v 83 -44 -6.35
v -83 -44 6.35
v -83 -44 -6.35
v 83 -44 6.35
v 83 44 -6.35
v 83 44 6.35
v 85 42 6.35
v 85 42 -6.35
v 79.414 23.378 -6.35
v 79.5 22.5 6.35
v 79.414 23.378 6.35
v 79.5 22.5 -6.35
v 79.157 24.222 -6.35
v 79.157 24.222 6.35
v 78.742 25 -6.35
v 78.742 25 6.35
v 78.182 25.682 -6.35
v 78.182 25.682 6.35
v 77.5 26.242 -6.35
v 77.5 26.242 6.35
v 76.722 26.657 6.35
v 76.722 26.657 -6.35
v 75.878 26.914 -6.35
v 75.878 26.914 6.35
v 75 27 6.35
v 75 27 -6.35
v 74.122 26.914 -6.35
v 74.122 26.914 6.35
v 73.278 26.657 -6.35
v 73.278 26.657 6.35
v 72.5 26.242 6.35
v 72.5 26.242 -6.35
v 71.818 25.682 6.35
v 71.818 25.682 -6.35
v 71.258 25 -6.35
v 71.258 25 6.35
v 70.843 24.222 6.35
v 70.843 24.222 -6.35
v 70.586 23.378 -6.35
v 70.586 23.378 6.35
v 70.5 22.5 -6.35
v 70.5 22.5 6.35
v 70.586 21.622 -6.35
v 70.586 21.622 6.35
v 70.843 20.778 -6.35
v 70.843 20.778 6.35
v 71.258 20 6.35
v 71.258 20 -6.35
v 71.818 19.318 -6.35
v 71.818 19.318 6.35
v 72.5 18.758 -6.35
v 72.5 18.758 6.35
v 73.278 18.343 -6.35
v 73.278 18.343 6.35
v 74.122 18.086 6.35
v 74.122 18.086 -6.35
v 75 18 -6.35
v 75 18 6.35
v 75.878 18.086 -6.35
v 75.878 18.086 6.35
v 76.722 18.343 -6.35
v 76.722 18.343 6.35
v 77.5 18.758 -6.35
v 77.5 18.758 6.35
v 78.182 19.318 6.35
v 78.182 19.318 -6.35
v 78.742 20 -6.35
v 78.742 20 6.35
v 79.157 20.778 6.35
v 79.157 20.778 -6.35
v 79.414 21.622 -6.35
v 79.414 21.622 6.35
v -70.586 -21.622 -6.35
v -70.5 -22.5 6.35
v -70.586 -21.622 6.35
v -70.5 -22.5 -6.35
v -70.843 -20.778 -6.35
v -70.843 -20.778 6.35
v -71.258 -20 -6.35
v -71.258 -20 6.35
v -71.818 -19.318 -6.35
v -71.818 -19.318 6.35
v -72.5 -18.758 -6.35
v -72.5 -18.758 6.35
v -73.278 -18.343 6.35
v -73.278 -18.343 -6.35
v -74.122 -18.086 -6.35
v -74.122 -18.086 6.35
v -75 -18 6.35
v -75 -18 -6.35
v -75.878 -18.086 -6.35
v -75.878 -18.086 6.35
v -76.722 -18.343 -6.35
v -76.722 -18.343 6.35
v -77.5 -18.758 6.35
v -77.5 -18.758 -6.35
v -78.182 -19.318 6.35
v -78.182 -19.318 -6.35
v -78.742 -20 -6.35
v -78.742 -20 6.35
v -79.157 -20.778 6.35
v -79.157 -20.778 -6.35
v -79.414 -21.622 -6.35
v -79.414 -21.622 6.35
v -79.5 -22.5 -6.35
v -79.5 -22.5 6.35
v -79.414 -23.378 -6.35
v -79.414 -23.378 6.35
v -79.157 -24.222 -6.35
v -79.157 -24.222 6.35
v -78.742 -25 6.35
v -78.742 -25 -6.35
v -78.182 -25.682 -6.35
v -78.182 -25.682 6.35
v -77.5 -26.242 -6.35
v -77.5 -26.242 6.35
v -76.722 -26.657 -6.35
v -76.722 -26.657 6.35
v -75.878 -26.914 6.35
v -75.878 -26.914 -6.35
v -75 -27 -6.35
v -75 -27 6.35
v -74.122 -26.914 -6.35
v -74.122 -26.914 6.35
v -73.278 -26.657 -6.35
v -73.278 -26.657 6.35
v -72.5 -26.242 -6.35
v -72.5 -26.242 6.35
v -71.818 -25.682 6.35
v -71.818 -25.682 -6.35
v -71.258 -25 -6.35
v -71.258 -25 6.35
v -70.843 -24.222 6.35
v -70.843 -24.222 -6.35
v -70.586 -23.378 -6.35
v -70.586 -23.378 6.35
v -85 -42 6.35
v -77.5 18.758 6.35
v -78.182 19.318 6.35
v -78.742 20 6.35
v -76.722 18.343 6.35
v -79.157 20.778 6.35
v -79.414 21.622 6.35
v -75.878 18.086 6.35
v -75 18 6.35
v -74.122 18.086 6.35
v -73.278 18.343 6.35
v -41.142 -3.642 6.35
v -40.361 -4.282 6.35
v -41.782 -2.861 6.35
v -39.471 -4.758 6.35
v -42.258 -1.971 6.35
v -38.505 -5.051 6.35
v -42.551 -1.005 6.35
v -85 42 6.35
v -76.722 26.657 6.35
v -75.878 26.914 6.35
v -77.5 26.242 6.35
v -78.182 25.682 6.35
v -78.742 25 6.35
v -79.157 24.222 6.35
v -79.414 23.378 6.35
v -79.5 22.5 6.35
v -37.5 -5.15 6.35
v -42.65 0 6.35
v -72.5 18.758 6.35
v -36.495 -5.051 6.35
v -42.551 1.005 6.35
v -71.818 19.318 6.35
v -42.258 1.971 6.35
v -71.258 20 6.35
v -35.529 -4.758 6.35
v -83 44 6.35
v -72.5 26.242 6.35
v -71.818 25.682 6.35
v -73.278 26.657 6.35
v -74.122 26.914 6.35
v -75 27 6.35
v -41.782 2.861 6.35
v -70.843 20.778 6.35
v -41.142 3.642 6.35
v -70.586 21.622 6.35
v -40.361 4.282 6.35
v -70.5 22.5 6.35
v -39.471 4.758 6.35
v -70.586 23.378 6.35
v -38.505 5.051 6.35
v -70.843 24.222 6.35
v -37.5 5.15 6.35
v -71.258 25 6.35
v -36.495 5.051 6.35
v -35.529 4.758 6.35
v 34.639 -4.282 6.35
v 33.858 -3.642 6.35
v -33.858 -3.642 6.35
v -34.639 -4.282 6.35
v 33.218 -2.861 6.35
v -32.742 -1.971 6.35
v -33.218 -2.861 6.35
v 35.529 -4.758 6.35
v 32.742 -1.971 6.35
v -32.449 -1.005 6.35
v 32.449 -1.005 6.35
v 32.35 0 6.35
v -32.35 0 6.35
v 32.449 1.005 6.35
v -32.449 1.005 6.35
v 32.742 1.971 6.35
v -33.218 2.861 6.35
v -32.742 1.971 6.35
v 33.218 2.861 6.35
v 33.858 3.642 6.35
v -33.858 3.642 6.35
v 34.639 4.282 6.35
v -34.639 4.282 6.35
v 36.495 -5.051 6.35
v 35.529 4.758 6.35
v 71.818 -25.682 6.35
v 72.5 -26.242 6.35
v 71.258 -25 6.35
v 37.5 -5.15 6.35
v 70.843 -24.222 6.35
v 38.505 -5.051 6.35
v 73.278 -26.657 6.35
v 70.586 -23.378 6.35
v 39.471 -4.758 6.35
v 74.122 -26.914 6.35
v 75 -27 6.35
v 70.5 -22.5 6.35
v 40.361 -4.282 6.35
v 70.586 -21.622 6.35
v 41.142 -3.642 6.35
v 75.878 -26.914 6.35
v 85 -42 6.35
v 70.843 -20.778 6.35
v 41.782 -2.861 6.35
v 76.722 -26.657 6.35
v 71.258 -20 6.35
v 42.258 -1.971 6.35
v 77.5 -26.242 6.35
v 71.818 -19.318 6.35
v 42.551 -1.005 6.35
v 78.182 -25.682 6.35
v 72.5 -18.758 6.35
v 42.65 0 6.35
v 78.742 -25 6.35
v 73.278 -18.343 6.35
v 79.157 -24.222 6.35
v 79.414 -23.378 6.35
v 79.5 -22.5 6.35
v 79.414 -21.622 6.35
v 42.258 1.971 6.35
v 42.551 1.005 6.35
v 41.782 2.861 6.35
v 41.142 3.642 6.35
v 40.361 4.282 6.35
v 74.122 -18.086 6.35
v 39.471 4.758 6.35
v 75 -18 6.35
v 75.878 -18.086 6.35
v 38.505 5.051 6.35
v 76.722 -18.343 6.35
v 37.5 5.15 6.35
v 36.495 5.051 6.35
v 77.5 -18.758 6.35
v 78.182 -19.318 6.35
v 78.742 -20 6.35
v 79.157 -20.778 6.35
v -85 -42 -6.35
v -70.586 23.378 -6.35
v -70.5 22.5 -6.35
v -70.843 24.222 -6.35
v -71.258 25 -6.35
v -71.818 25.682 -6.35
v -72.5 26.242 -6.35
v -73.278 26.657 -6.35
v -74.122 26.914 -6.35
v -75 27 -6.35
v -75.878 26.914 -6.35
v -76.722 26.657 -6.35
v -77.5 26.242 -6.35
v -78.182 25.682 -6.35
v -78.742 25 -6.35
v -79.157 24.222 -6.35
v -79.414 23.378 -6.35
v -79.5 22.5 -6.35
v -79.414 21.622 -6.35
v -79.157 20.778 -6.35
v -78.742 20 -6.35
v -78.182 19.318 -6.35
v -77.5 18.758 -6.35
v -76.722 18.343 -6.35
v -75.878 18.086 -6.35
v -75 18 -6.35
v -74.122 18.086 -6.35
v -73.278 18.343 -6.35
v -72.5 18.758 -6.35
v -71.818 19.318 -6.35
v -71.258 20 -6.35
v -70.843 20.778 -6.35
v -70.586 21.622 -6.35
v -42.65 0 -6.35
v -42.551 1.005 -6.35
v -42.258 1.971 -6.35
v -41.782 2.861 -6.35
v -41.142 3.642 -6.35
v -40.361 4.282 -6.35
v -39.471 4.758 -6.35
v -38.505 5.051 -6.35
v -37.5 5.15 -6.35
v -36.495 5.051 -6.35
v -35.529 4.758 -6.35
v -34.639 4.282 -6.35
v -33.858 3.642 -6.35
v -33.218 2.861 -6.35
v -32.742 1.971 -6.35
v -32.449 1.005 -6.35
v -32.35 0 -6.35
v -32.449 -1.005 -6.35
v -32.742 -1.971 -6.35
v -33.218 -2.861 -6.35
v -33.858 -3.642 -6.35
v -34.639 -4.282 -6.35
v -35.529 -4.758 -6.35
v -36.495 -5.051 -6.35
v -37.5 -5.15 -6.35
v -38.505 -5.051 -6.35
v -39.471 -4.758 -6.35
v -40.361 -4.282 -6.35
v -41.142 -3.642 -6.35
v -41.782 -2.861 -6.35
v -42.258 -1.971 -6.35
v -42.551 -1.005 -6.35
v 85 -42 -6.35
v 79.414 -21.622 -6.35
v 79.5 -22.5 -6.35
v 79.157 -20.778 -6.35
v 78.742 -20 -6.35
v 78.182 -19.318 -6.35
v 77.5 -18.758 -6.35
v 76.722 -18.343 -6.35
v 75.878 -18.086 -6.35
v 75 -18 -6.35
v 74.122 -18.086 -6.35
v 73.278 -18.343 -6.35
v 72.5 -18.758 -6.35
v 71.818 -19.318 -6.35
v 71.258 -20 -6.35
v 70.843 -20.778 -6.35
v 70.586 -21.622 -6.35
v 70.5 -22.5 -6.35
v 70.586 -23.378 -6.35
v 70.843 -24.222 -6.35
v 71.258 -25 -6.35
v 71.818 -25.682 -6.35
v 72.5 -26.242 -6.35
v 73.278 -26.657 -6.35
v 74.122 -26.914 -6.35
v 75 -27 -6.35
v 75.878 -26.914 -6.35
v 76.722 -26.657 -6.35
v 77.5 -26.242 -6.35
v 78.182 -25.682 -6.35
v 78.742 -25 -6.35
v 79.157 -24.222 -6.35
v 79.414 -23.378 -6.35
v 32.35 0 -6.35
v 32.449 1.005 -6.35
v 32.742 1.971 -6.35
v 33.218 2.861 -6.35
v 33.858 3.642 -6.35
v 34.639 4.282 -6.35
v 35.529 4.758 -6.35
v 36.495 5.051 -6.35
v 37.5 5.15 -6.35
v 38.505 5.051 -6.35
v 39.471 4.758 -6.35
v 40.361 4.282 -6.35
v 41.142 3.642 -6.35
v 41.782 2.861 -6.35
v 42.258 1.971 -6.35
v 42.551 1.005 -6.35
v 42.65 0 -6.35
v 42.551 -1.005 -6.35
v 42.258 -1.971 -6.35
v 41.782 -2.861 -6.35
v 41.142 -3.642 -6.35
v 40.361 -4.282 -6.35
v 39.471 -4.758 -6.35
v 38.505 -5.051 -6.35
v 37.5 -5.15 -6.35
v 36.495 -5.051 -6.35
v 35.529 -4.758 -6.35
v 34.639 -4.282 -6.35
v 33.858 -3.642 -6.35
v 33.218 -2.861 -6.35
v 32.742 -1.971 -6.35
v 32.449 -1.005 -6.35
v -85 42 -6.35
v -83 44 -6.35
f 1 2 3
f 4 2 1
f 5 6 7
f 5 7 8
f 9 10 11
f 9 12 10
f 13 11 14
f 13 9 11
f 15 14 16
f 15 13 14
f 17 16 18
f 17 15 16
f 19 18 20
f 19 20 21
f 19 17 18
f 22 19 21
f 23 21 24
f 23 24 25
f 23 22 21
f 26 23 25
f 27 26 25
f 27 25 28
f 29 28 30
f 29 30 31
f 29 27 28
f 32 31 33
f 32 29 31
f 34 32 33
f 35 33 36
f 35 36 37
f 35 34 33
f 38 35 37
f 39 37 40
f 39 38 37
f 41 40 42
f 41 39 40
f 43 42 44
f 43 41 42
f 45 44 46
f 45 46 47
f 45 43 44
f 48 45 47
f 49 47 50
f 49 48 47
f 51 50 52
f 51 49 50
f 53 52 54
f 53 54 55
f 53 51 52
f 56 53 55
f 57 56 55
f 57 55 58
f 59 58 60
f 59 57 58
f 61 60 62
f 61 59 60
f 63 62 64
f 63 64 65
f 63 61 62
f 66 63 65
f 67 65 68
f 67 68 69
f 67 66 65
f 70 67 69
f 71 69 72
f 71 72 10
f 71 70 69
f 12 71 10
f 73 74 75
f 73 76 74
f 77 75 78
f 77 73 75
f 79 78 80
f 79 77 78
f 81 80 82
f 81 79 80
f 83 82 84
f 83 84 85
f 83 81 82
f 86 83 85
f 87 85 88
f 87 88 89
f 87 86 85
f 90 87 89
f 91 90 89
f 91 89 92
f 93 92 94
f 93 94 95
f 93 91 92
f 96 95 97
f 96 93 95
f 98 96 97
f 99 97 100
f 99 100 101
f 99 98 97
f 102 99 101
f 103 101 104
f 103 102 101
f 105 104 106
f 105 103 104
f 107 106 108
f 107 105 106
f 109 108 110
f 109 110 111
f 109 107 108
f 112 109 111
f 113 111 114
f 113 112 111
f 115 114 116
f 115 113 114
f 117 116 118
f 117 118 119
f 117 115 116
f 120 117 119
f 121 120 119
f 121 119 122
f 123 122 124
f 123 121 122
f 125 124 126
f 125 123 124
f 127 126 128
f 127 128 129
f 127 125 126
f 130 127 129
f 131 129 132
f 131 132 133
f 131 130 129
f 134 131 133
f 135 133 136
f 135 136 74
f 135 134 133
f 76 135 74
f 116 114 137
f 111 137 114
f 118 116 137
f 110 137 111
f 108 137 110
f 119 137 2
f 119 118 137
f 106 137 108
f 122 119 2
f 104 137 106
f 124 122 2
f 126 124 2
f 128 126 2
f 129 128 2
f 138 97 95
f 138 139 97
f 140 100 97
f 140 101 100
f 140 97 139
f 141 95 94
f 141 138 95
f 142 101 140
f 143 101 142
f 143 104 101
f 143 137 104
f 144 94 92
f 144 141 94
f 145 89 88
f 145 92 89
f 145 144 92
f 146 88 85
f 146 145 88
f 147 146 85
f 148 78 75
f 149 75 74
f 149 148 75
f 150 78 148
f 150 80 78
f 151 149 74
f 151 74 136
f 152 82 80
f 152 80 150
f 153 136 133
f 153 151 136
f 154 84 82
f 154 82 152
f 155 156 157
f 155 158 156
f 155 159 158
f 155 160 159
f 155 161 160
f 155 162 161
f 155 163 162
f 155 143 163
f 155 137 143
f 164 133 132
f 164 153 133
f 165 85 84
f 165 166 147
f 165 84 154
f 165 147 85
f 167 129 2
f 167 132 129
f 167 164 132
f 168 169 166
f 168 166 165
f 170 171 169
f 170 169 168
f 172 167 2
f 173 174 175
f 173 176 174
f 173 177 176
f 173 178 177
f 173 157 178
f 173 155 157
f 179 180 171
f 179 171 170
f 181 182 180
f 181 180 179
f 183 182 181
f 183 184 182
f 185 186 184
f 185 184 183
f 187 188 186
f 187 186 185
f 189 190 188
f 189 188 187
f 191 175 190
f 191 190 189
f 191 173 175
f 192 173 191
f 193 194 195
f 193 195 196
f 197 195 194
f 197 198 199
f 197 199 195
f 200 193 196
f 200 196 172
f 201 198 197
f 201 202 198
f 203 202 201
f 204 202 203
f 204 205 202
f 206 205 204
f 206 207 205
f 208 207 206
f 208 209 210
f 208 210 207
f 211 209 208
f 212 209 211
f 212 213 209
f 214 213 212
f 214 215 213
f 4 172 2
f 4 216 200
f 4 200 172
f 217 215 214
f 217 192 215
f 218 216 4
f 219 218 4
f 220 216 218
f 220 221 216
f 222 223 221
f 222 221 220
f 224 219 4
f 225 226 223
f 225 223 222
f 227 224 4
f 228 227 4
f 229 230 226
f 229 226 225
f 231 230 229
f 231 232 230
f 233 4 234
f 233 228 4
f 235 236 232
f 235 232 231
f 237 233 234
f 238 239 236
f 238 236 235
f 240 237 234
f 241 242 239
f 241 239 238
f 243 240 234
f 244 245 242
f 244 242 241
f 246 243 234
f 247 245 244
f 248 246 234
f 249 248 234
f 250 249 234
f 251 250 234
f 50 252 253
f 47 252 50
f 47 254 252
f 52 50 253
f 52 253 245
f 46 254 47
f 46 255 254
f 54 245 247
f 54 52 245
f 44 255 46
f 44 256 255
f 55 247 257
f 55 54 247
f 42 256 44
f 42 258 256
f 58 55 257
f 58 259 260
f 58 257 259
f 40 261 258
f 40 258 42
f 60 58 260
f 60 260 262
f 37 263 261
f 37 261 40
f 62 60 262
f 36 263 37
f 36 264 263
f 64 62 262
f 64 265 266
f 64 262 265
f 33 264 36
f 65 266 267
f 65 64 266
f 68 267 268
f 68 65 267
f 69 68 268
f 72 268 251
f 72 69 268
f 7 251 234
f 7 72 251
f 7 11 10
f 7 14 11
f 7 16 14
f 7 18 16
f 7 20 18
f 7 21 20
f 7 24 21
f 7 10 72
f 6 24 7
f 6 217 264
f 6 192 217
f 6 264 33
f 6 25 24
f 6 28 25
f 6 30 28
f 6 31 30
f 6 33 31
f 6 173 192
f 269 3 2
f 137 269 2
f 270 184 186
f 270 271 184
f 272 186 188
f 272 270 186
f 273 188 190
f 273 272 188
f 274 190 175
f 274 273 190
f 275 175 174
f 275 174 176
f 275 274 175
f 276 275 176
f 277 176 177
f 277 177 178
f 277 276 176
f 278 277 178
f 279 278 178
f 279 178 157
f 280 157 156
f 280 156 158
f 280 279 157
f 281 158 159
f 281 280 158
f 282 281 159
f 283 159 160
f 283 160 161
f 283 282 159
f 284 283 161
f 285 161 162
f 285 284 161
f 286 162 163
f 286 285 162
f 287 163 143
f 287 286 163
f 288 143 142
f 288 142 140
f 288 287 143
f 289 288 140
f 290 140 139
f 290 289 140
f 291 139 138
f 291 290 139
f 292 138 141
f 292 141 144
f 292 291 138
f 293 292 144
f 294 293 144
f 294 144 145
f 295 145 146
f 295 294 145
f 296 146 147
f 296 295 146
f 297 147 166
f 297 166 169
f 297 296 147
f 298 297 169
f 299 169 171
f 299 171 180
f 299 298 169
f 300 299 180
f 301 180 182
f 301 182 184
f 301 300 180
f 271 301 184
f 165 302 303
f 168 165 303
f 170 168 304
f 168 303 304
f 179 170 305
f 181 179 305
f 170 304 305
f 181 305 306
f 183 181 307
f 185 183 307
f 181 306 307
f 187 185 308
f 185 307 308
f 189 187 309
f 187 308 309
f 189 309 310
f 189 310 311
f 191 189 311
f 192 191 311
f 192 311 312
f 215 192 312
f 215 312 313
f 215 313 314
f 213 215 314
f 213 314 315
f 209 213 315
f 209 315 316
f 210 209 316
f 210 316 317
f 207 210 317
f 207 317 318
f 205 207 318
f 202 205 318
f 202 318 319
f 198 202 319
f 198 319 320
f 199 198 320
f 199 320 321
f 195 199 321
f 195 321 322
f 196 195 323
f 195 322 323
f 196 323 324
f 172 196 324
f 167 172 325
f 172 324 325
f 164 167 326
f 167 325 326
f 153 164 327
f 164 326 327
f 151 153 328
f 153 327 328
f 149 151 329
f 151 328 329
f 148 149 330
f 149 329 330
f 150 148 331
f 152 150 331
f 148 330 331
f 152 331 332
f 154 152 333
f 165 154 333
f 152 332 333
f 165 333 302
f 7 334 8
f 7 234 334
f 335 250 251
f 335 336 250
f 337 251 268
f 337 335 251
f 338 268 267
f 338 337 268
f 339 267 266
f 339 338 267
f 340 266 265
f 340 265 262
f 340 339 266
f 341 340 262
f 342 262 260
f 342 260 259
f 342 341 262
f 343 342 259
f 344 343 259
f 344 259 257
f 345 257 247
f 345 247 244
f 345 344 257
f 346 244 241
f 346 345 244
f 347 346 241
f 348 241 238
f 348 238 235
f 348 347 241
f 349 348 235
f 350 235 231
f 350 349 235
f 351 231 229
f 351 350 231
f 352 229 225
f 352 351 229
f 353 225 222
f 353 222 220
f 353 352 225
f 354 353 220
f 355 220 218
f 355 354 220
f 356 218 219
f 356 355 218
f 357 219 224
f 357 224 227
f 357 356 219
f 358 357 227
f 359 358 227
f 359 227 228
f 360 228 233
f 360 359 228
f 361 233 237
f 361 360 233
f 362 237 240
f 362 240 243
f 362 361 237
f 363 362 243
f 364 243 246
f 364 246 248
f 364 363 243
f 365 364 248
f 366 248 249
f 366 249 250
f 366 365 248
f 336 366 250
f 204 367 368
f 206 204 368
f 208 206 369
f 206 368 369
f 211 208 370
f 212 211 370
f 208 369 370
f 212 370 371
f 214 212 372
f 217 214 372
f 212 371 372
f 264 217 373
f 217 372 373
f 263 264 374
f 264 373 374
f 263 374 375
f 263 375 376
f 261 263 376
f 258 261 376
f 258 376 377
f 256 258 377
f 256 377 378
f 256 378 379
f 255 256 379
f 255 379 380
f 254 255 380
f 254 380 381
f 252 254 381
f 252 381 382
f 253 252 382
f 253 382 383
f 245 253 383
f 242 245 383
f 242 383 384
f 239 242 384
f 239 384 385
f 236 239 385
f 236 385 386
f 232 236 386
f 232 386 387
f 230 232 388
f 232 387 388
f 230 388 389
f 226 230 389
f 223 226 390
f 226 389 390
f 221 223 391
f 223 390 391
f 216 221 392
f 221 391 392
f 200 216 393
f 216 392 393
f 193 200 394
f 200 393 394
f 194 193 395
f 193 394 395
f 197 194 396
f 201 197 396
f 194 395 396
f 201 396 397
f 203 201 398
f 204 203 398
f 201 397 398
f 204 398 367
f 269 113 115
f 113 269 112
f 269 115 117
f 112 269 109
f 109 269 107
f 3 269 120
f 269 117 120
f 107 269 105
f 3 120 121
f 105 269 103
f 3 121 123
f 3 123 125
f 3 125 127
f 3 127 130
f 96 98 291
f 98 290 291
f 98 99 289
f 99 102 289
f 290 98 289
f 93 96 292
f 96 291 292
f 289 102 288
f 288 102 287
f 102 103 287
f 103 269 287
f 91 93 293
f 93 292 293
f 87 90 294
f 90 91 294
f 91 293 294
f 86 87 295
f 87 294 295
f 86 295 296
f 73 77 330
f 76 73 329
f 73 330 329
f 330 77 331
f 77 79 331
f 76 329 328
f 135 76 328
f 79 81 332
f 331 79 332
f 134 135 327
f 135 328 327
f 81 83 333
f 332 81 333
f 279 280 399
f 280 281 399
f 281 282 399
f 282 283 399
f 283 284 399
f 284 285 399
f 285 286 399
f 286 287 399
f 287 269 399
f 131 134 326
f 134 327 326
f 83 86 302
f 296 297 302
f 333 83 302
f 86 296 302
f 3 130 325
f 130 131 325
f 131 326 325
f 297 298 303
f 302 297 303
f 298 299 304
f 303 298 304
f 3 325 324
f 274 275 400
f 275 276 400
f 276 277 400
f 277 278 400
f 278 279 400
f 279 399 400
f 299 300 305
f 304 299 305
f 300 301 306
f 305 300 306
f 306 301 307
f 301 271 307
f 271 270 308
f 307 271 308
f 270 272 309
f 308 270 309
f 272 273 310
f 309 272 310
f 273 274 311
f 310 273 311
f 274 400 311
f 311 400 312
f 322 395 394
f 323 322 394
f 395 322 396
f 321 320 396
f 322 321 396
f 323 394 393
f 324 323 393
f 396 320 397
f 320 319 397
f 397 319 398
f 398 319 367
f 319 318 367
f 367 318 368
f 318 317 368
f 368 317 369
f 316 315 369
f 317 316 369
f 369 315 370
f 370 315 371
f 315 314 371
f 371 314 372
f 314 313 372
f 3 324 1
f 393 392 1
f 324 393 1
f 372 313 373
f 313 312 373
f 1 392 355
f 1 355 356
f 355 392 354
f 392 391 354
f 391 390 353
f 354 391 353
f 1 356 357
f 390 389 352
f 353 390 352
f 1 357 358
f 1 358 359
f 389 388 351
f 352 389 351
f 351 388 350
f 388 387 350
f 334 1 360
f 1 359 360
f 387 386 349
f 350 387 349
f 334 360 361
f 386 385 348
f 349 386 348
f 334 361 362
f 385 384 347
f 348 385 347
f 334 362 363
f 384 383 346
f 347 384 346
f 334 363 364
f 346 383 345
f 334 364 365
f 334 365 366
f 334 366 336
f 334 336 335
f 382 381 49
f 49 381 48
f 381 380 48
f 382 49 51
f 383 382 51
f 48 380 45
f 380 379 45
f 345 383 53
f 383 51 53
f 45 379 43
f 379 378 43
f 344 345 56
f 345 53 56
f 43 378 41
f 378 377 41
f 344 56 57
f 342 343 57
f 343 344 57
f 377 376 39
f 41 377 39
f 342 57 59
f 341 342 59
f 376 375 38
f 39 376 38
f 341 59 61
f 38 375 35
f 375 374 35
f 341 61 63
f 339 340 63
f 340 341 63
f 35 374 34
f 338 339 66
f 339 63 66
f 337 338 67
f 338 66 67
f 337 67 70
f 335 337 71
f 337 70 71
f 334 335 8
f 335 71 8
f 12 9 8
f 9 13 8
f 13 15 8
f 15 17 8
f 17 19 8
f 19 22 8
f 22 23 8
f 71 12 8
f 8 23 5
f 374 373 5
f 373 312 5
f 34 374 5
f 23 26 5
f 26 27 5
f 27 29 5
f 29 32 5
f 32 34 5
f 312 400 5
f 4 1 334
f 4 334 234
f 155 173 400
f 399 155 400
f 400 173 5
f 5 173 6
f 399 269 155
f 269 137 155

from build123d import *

# Parameters (mm, degrees)
F0_W     = 170
F0_H     = 88
F0_R     = 4.5
F1_DEPTH = 6.35
F2_SIZE  = 2
F4_D     = 10.3


with BuildPart() as f1:
    # F0 (on Top) → F1 (new body, symmetric)
    with BuildSketch(Plane.XY):
        Rectangle(F0_W, F0_H)
        with Locations((-75, -22.5)):
            Circle(F0_R, mode=Mode.SUBTRACT)
        with Locations((75, -22.5)):
            Circle(F0_R, mode=Mode.SUBTRACT)
        with Locations((-75, 22.5)):
            Circle(F0_R, mode=Mode.SUBTRACT)
        with Locations((75, 22.5)):
            Circle(F0_R, mode=Mode.SUBTRACT)
    extrude(amount=F1_DEPTH, both=True)

    # F2
    f2_edges = [f1.edges().sort_by_distance(p)[0] for p in [
        (85, 44, 0),
        (85, -44, 0),
        (-85, 44, 0),
        (-85, -44, 0),
    ]]
    chamfer(f2_edges, length=F2_SIZE)

    # F4 (through all)
    with Locations(Plane.XY.offset(6.35)):
        with Locations((-37.5, 0), (37.5, 0)):
            Hole(F4_D / 2)


solid = f1.part
